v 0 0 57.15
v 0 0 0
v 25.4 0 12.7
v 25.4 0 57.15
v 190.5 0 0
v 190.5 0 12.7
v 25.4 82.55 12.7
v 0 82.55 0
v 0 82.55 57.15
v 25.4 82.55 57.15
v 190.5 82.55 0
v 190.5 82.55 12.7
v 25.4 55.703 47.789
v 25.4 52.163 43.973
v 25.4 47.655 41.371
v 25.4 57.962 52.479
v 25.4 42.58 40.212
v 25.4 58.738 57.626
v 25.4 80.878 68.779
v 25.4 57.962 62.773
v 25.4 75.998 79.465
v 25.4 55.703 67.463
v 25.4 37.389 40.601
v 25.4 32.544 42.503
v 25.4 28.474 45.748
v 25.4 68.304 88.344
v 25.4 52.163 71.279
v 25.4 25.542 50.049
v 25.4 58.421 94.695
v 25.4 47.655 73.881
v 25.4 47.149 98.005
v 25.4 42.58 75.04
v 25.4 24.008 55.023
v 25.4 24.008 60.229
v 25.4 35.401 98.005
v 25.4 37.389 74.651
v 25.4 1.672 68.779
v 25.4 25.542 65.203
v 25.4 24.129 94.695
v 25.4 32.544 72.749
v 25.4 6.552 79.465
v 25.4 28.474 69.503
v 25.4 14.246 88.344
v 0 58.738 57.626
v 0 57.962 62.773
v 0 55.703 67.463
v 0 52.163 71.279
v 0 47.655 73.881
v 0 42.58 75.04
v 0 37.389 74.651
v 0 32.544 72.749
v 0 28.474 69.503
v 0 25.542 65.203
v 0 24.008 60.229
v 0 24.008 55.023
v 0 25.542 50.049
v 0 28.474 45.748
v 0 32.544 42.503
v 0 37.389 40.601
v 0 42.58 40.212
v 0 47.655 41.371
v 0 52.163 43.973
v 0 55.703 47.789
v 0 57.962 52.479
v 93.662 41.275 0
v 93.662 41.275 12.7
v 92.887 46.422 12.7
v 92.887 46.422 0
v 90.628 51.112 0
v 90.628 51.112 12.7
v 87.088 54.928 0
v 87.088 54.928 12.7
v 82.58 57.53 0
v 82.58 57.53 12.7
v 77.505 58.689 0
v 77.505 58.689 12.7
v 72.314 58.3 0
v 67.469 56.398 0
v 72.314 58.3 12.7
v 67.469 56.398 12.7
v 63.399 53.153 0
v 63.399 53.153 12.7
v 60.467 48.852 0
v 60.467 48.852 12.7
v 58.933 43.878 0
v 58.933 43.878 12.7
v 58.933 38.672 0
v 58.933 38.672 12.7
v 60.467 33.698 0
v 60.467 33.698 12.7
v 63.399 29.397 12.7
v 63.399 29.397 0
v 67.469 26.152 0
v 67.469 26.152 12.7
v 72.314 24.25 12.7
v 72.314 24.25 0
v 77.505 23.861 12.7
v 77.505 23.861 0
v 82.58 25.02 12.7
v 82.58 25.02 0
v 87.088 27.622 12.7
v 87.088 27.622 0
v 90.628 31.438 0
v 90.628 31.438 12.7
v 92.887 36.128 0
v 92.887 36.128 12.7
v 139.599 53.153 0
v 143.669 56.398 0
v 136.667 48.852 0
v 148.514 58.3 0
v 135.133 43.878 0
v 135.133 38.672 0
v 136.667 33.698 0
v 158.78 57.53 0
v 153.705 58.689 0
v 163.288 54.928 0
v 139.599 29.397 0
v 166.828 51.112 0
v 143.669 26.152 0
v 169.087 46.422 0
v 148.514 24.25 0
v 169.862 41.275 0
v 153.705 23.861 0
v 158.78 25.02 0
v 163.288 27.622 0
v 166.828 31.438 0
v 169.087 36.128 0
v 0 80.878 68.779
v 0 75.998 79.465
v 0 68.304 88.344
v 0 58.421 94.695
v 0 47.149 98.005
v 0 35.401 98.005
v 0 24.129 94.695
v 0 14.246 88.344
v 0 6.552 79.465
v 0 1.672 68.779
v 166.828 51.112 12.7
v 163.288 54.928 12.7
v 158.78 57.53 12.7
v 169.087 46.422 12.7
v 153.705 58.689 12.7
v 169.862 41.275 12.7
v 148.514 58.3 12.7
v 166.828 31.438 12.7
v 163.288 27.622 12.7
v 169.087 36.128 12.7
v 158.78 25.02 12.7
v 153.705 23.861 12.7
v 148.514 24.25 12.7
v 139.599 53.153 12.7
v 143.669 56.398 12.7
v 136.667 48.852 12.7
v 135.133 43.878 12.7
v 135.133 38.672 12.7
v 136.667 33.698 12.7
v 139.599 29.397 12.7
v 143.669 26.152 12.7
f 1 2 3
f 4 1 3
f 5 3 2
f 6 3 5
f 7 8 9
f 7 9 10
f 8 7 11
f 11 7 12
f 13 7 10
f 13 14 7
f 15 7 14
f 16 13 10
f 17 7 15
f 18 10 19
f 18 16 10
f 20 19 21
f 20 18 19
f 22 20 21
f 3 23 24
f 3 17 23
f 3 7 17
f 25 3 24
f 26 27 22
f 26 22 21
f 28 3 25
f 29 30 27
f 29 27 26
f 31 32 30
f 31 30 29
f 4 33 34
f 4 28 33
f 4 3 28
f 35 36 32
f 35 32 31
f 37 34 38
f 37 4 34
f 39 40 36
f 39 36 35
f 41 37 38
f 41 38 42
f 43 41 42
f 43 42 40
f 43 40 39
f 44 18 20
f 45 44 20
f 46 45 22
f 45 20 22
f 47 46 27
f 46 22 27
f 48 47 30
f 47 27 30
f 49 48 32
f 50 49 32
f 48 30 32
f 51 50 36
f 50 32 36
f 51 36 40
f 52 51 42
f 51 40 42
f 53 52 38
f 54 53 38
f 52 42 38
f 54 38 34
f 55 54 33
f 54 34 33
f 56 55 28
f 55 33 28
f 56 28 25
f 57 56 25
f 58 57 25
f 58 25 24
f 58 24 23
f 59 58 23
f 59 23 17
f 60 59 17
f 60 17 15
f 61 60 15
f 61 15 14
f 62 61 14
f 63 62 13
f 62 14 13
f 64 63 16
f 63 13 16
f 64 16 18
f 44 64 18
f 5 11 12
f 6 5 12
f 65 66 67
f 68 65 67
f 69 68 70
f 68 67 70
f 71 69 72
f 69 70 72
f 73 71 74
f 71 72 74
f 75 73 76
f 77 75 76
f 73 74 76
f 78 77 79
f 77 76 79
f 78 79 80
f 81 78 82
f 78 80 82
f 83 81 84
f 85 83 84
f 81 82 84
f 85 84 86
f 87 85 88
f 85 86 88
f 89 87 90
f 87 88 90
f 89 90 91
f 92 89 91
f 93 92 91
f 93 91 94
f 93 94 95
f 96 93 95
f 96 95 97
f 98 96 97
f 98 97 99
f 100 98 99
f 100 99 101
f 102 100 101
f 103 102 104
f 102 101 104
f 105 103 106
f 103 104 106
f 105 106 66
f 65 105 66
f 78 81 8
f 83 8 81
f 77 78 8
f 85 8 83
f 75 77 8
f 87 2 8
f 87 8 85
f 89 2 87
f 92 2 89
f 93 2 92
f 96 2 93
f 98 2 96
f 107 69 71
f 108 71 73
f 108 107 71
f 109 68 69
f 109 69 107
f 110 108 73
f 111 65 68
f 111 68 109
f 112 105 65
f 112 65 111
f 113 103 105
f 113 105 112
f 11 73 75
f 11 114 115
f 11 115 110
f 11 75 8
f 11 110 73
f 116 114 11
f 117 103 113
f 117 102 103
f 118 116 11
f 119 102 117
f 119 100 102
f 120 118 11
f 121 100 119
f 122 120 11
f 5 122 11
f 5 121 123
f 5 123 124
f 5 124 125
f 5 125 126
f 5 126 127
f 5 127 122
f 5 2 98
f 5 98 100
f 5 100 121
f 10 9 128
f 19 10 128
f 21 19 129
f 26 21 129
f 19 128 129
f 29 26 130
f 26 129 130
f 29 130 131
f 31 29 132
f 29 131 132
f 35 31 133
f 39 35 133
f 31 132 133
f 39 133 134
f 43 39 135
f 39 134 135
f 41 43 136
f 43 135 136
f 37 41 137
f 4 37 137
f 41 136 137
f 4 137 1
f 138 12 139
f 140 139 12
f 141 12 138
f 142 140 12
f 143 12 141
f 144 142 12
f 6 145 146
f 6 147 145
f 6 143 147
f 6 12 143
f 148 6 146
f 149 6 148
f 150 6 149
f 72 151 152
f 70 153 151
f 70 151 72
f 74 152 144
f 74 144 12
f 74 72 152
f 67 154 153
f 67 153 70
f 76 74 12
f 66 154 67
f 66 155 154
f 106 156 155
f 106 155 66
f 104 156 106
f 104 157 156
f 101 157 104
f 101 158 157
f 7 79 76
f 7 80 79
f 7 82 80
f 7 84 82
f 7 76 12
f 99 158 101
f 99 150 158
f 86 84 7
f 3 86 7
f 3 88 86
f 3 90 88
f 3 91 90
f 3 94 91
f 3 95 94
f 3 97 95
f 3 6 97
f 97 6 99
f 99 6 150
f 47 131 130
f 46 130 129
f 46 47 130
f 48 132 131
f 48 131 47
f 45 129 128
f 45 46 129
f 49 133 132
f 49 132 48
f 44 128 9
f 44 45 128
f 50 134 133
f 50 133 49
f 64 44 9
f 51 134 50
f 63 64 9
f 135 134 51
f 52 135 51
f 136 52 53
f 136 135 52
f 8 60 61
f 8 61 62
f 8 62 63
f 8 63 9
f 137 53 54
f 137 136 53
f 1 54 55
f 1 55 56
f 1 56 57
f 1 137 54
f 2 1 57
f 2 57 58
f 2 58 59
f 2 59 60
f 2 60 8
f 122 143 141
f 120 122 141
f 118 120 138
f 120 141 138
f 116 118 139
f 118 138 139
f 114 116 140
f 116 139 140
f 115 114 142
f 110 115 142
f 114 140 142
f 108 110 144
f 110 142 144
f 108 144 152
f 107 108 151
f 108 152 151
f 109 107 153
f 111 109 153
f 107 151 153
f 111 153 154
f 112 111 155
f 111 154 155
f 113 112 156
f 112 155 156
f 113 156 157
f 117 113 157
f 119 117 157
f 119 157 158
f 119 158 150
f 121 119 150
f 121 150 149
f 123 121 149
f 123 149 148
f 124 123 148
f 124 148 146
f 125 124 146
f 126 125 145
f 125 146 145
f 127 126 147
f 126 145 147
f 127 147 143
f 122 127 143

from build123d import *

# Parameters (mm, degrees)
F1_DEPTH = 82.55
F2_R     = 17.4625
F3_DEPTH = 12.7
F6_DEPTH = 25.4
F7_R     = 17.4625
F8_DEPTH = 25.4


with BuildPart() as f1:
    # F0 (on Front) → F1 (new body)
    with BuildSketch(Plane.XZ):
        Polygon((0, 114.3), (0, 0), (190.5, 0), (190.5, 12.7), (25.4, 12.7), (25.4, 114.3), align=None)
    extrude(amount=-F1_DEPTH)

    # F2 (on face) → F3 (cut)
    with BuildSketch(Plane.XY.offset(12.7)):
        with Locations((76.2, 41.275)):
            Circle(F2_R)
        with Locations((152.4, 41.275)):
            Circle(F2_R)
    extrude(amount=-F3_DEPTH, mode=Mode.SUBTRACT)

    # F5 (on face) → F6 (cut)
    with BuildSketch(Plane(origin=(0, 0, 0), x_dir=(0, -1, 0), z_dir=(-1, 0, 0))):
        with BuildLine():
            ThreePointArc((-82.55, 57.15), (-41.275, 98.425), (0, 57.15))
            Line((0, 57.15), (0, 114.3))
            Line((0, 114.3), (-82.55, 114.3))
            Line((-82.55, 114.3), (-82.55, 57.15))
        make_face()
    extrude(amount=-F6_DEPTH, mode=Mode.SUBTRACT)

    # F7 (on face) → F8 (cut, through all)
    with BuildSketch(Plane.YZ.offset(25.4)):
        with Locations((41.275, 57.625926)):
            Circle(F7_R)
    extrude(amount=-F8_DEPTH, mode=Mode.SUBTRACT)


solid = f1.part
